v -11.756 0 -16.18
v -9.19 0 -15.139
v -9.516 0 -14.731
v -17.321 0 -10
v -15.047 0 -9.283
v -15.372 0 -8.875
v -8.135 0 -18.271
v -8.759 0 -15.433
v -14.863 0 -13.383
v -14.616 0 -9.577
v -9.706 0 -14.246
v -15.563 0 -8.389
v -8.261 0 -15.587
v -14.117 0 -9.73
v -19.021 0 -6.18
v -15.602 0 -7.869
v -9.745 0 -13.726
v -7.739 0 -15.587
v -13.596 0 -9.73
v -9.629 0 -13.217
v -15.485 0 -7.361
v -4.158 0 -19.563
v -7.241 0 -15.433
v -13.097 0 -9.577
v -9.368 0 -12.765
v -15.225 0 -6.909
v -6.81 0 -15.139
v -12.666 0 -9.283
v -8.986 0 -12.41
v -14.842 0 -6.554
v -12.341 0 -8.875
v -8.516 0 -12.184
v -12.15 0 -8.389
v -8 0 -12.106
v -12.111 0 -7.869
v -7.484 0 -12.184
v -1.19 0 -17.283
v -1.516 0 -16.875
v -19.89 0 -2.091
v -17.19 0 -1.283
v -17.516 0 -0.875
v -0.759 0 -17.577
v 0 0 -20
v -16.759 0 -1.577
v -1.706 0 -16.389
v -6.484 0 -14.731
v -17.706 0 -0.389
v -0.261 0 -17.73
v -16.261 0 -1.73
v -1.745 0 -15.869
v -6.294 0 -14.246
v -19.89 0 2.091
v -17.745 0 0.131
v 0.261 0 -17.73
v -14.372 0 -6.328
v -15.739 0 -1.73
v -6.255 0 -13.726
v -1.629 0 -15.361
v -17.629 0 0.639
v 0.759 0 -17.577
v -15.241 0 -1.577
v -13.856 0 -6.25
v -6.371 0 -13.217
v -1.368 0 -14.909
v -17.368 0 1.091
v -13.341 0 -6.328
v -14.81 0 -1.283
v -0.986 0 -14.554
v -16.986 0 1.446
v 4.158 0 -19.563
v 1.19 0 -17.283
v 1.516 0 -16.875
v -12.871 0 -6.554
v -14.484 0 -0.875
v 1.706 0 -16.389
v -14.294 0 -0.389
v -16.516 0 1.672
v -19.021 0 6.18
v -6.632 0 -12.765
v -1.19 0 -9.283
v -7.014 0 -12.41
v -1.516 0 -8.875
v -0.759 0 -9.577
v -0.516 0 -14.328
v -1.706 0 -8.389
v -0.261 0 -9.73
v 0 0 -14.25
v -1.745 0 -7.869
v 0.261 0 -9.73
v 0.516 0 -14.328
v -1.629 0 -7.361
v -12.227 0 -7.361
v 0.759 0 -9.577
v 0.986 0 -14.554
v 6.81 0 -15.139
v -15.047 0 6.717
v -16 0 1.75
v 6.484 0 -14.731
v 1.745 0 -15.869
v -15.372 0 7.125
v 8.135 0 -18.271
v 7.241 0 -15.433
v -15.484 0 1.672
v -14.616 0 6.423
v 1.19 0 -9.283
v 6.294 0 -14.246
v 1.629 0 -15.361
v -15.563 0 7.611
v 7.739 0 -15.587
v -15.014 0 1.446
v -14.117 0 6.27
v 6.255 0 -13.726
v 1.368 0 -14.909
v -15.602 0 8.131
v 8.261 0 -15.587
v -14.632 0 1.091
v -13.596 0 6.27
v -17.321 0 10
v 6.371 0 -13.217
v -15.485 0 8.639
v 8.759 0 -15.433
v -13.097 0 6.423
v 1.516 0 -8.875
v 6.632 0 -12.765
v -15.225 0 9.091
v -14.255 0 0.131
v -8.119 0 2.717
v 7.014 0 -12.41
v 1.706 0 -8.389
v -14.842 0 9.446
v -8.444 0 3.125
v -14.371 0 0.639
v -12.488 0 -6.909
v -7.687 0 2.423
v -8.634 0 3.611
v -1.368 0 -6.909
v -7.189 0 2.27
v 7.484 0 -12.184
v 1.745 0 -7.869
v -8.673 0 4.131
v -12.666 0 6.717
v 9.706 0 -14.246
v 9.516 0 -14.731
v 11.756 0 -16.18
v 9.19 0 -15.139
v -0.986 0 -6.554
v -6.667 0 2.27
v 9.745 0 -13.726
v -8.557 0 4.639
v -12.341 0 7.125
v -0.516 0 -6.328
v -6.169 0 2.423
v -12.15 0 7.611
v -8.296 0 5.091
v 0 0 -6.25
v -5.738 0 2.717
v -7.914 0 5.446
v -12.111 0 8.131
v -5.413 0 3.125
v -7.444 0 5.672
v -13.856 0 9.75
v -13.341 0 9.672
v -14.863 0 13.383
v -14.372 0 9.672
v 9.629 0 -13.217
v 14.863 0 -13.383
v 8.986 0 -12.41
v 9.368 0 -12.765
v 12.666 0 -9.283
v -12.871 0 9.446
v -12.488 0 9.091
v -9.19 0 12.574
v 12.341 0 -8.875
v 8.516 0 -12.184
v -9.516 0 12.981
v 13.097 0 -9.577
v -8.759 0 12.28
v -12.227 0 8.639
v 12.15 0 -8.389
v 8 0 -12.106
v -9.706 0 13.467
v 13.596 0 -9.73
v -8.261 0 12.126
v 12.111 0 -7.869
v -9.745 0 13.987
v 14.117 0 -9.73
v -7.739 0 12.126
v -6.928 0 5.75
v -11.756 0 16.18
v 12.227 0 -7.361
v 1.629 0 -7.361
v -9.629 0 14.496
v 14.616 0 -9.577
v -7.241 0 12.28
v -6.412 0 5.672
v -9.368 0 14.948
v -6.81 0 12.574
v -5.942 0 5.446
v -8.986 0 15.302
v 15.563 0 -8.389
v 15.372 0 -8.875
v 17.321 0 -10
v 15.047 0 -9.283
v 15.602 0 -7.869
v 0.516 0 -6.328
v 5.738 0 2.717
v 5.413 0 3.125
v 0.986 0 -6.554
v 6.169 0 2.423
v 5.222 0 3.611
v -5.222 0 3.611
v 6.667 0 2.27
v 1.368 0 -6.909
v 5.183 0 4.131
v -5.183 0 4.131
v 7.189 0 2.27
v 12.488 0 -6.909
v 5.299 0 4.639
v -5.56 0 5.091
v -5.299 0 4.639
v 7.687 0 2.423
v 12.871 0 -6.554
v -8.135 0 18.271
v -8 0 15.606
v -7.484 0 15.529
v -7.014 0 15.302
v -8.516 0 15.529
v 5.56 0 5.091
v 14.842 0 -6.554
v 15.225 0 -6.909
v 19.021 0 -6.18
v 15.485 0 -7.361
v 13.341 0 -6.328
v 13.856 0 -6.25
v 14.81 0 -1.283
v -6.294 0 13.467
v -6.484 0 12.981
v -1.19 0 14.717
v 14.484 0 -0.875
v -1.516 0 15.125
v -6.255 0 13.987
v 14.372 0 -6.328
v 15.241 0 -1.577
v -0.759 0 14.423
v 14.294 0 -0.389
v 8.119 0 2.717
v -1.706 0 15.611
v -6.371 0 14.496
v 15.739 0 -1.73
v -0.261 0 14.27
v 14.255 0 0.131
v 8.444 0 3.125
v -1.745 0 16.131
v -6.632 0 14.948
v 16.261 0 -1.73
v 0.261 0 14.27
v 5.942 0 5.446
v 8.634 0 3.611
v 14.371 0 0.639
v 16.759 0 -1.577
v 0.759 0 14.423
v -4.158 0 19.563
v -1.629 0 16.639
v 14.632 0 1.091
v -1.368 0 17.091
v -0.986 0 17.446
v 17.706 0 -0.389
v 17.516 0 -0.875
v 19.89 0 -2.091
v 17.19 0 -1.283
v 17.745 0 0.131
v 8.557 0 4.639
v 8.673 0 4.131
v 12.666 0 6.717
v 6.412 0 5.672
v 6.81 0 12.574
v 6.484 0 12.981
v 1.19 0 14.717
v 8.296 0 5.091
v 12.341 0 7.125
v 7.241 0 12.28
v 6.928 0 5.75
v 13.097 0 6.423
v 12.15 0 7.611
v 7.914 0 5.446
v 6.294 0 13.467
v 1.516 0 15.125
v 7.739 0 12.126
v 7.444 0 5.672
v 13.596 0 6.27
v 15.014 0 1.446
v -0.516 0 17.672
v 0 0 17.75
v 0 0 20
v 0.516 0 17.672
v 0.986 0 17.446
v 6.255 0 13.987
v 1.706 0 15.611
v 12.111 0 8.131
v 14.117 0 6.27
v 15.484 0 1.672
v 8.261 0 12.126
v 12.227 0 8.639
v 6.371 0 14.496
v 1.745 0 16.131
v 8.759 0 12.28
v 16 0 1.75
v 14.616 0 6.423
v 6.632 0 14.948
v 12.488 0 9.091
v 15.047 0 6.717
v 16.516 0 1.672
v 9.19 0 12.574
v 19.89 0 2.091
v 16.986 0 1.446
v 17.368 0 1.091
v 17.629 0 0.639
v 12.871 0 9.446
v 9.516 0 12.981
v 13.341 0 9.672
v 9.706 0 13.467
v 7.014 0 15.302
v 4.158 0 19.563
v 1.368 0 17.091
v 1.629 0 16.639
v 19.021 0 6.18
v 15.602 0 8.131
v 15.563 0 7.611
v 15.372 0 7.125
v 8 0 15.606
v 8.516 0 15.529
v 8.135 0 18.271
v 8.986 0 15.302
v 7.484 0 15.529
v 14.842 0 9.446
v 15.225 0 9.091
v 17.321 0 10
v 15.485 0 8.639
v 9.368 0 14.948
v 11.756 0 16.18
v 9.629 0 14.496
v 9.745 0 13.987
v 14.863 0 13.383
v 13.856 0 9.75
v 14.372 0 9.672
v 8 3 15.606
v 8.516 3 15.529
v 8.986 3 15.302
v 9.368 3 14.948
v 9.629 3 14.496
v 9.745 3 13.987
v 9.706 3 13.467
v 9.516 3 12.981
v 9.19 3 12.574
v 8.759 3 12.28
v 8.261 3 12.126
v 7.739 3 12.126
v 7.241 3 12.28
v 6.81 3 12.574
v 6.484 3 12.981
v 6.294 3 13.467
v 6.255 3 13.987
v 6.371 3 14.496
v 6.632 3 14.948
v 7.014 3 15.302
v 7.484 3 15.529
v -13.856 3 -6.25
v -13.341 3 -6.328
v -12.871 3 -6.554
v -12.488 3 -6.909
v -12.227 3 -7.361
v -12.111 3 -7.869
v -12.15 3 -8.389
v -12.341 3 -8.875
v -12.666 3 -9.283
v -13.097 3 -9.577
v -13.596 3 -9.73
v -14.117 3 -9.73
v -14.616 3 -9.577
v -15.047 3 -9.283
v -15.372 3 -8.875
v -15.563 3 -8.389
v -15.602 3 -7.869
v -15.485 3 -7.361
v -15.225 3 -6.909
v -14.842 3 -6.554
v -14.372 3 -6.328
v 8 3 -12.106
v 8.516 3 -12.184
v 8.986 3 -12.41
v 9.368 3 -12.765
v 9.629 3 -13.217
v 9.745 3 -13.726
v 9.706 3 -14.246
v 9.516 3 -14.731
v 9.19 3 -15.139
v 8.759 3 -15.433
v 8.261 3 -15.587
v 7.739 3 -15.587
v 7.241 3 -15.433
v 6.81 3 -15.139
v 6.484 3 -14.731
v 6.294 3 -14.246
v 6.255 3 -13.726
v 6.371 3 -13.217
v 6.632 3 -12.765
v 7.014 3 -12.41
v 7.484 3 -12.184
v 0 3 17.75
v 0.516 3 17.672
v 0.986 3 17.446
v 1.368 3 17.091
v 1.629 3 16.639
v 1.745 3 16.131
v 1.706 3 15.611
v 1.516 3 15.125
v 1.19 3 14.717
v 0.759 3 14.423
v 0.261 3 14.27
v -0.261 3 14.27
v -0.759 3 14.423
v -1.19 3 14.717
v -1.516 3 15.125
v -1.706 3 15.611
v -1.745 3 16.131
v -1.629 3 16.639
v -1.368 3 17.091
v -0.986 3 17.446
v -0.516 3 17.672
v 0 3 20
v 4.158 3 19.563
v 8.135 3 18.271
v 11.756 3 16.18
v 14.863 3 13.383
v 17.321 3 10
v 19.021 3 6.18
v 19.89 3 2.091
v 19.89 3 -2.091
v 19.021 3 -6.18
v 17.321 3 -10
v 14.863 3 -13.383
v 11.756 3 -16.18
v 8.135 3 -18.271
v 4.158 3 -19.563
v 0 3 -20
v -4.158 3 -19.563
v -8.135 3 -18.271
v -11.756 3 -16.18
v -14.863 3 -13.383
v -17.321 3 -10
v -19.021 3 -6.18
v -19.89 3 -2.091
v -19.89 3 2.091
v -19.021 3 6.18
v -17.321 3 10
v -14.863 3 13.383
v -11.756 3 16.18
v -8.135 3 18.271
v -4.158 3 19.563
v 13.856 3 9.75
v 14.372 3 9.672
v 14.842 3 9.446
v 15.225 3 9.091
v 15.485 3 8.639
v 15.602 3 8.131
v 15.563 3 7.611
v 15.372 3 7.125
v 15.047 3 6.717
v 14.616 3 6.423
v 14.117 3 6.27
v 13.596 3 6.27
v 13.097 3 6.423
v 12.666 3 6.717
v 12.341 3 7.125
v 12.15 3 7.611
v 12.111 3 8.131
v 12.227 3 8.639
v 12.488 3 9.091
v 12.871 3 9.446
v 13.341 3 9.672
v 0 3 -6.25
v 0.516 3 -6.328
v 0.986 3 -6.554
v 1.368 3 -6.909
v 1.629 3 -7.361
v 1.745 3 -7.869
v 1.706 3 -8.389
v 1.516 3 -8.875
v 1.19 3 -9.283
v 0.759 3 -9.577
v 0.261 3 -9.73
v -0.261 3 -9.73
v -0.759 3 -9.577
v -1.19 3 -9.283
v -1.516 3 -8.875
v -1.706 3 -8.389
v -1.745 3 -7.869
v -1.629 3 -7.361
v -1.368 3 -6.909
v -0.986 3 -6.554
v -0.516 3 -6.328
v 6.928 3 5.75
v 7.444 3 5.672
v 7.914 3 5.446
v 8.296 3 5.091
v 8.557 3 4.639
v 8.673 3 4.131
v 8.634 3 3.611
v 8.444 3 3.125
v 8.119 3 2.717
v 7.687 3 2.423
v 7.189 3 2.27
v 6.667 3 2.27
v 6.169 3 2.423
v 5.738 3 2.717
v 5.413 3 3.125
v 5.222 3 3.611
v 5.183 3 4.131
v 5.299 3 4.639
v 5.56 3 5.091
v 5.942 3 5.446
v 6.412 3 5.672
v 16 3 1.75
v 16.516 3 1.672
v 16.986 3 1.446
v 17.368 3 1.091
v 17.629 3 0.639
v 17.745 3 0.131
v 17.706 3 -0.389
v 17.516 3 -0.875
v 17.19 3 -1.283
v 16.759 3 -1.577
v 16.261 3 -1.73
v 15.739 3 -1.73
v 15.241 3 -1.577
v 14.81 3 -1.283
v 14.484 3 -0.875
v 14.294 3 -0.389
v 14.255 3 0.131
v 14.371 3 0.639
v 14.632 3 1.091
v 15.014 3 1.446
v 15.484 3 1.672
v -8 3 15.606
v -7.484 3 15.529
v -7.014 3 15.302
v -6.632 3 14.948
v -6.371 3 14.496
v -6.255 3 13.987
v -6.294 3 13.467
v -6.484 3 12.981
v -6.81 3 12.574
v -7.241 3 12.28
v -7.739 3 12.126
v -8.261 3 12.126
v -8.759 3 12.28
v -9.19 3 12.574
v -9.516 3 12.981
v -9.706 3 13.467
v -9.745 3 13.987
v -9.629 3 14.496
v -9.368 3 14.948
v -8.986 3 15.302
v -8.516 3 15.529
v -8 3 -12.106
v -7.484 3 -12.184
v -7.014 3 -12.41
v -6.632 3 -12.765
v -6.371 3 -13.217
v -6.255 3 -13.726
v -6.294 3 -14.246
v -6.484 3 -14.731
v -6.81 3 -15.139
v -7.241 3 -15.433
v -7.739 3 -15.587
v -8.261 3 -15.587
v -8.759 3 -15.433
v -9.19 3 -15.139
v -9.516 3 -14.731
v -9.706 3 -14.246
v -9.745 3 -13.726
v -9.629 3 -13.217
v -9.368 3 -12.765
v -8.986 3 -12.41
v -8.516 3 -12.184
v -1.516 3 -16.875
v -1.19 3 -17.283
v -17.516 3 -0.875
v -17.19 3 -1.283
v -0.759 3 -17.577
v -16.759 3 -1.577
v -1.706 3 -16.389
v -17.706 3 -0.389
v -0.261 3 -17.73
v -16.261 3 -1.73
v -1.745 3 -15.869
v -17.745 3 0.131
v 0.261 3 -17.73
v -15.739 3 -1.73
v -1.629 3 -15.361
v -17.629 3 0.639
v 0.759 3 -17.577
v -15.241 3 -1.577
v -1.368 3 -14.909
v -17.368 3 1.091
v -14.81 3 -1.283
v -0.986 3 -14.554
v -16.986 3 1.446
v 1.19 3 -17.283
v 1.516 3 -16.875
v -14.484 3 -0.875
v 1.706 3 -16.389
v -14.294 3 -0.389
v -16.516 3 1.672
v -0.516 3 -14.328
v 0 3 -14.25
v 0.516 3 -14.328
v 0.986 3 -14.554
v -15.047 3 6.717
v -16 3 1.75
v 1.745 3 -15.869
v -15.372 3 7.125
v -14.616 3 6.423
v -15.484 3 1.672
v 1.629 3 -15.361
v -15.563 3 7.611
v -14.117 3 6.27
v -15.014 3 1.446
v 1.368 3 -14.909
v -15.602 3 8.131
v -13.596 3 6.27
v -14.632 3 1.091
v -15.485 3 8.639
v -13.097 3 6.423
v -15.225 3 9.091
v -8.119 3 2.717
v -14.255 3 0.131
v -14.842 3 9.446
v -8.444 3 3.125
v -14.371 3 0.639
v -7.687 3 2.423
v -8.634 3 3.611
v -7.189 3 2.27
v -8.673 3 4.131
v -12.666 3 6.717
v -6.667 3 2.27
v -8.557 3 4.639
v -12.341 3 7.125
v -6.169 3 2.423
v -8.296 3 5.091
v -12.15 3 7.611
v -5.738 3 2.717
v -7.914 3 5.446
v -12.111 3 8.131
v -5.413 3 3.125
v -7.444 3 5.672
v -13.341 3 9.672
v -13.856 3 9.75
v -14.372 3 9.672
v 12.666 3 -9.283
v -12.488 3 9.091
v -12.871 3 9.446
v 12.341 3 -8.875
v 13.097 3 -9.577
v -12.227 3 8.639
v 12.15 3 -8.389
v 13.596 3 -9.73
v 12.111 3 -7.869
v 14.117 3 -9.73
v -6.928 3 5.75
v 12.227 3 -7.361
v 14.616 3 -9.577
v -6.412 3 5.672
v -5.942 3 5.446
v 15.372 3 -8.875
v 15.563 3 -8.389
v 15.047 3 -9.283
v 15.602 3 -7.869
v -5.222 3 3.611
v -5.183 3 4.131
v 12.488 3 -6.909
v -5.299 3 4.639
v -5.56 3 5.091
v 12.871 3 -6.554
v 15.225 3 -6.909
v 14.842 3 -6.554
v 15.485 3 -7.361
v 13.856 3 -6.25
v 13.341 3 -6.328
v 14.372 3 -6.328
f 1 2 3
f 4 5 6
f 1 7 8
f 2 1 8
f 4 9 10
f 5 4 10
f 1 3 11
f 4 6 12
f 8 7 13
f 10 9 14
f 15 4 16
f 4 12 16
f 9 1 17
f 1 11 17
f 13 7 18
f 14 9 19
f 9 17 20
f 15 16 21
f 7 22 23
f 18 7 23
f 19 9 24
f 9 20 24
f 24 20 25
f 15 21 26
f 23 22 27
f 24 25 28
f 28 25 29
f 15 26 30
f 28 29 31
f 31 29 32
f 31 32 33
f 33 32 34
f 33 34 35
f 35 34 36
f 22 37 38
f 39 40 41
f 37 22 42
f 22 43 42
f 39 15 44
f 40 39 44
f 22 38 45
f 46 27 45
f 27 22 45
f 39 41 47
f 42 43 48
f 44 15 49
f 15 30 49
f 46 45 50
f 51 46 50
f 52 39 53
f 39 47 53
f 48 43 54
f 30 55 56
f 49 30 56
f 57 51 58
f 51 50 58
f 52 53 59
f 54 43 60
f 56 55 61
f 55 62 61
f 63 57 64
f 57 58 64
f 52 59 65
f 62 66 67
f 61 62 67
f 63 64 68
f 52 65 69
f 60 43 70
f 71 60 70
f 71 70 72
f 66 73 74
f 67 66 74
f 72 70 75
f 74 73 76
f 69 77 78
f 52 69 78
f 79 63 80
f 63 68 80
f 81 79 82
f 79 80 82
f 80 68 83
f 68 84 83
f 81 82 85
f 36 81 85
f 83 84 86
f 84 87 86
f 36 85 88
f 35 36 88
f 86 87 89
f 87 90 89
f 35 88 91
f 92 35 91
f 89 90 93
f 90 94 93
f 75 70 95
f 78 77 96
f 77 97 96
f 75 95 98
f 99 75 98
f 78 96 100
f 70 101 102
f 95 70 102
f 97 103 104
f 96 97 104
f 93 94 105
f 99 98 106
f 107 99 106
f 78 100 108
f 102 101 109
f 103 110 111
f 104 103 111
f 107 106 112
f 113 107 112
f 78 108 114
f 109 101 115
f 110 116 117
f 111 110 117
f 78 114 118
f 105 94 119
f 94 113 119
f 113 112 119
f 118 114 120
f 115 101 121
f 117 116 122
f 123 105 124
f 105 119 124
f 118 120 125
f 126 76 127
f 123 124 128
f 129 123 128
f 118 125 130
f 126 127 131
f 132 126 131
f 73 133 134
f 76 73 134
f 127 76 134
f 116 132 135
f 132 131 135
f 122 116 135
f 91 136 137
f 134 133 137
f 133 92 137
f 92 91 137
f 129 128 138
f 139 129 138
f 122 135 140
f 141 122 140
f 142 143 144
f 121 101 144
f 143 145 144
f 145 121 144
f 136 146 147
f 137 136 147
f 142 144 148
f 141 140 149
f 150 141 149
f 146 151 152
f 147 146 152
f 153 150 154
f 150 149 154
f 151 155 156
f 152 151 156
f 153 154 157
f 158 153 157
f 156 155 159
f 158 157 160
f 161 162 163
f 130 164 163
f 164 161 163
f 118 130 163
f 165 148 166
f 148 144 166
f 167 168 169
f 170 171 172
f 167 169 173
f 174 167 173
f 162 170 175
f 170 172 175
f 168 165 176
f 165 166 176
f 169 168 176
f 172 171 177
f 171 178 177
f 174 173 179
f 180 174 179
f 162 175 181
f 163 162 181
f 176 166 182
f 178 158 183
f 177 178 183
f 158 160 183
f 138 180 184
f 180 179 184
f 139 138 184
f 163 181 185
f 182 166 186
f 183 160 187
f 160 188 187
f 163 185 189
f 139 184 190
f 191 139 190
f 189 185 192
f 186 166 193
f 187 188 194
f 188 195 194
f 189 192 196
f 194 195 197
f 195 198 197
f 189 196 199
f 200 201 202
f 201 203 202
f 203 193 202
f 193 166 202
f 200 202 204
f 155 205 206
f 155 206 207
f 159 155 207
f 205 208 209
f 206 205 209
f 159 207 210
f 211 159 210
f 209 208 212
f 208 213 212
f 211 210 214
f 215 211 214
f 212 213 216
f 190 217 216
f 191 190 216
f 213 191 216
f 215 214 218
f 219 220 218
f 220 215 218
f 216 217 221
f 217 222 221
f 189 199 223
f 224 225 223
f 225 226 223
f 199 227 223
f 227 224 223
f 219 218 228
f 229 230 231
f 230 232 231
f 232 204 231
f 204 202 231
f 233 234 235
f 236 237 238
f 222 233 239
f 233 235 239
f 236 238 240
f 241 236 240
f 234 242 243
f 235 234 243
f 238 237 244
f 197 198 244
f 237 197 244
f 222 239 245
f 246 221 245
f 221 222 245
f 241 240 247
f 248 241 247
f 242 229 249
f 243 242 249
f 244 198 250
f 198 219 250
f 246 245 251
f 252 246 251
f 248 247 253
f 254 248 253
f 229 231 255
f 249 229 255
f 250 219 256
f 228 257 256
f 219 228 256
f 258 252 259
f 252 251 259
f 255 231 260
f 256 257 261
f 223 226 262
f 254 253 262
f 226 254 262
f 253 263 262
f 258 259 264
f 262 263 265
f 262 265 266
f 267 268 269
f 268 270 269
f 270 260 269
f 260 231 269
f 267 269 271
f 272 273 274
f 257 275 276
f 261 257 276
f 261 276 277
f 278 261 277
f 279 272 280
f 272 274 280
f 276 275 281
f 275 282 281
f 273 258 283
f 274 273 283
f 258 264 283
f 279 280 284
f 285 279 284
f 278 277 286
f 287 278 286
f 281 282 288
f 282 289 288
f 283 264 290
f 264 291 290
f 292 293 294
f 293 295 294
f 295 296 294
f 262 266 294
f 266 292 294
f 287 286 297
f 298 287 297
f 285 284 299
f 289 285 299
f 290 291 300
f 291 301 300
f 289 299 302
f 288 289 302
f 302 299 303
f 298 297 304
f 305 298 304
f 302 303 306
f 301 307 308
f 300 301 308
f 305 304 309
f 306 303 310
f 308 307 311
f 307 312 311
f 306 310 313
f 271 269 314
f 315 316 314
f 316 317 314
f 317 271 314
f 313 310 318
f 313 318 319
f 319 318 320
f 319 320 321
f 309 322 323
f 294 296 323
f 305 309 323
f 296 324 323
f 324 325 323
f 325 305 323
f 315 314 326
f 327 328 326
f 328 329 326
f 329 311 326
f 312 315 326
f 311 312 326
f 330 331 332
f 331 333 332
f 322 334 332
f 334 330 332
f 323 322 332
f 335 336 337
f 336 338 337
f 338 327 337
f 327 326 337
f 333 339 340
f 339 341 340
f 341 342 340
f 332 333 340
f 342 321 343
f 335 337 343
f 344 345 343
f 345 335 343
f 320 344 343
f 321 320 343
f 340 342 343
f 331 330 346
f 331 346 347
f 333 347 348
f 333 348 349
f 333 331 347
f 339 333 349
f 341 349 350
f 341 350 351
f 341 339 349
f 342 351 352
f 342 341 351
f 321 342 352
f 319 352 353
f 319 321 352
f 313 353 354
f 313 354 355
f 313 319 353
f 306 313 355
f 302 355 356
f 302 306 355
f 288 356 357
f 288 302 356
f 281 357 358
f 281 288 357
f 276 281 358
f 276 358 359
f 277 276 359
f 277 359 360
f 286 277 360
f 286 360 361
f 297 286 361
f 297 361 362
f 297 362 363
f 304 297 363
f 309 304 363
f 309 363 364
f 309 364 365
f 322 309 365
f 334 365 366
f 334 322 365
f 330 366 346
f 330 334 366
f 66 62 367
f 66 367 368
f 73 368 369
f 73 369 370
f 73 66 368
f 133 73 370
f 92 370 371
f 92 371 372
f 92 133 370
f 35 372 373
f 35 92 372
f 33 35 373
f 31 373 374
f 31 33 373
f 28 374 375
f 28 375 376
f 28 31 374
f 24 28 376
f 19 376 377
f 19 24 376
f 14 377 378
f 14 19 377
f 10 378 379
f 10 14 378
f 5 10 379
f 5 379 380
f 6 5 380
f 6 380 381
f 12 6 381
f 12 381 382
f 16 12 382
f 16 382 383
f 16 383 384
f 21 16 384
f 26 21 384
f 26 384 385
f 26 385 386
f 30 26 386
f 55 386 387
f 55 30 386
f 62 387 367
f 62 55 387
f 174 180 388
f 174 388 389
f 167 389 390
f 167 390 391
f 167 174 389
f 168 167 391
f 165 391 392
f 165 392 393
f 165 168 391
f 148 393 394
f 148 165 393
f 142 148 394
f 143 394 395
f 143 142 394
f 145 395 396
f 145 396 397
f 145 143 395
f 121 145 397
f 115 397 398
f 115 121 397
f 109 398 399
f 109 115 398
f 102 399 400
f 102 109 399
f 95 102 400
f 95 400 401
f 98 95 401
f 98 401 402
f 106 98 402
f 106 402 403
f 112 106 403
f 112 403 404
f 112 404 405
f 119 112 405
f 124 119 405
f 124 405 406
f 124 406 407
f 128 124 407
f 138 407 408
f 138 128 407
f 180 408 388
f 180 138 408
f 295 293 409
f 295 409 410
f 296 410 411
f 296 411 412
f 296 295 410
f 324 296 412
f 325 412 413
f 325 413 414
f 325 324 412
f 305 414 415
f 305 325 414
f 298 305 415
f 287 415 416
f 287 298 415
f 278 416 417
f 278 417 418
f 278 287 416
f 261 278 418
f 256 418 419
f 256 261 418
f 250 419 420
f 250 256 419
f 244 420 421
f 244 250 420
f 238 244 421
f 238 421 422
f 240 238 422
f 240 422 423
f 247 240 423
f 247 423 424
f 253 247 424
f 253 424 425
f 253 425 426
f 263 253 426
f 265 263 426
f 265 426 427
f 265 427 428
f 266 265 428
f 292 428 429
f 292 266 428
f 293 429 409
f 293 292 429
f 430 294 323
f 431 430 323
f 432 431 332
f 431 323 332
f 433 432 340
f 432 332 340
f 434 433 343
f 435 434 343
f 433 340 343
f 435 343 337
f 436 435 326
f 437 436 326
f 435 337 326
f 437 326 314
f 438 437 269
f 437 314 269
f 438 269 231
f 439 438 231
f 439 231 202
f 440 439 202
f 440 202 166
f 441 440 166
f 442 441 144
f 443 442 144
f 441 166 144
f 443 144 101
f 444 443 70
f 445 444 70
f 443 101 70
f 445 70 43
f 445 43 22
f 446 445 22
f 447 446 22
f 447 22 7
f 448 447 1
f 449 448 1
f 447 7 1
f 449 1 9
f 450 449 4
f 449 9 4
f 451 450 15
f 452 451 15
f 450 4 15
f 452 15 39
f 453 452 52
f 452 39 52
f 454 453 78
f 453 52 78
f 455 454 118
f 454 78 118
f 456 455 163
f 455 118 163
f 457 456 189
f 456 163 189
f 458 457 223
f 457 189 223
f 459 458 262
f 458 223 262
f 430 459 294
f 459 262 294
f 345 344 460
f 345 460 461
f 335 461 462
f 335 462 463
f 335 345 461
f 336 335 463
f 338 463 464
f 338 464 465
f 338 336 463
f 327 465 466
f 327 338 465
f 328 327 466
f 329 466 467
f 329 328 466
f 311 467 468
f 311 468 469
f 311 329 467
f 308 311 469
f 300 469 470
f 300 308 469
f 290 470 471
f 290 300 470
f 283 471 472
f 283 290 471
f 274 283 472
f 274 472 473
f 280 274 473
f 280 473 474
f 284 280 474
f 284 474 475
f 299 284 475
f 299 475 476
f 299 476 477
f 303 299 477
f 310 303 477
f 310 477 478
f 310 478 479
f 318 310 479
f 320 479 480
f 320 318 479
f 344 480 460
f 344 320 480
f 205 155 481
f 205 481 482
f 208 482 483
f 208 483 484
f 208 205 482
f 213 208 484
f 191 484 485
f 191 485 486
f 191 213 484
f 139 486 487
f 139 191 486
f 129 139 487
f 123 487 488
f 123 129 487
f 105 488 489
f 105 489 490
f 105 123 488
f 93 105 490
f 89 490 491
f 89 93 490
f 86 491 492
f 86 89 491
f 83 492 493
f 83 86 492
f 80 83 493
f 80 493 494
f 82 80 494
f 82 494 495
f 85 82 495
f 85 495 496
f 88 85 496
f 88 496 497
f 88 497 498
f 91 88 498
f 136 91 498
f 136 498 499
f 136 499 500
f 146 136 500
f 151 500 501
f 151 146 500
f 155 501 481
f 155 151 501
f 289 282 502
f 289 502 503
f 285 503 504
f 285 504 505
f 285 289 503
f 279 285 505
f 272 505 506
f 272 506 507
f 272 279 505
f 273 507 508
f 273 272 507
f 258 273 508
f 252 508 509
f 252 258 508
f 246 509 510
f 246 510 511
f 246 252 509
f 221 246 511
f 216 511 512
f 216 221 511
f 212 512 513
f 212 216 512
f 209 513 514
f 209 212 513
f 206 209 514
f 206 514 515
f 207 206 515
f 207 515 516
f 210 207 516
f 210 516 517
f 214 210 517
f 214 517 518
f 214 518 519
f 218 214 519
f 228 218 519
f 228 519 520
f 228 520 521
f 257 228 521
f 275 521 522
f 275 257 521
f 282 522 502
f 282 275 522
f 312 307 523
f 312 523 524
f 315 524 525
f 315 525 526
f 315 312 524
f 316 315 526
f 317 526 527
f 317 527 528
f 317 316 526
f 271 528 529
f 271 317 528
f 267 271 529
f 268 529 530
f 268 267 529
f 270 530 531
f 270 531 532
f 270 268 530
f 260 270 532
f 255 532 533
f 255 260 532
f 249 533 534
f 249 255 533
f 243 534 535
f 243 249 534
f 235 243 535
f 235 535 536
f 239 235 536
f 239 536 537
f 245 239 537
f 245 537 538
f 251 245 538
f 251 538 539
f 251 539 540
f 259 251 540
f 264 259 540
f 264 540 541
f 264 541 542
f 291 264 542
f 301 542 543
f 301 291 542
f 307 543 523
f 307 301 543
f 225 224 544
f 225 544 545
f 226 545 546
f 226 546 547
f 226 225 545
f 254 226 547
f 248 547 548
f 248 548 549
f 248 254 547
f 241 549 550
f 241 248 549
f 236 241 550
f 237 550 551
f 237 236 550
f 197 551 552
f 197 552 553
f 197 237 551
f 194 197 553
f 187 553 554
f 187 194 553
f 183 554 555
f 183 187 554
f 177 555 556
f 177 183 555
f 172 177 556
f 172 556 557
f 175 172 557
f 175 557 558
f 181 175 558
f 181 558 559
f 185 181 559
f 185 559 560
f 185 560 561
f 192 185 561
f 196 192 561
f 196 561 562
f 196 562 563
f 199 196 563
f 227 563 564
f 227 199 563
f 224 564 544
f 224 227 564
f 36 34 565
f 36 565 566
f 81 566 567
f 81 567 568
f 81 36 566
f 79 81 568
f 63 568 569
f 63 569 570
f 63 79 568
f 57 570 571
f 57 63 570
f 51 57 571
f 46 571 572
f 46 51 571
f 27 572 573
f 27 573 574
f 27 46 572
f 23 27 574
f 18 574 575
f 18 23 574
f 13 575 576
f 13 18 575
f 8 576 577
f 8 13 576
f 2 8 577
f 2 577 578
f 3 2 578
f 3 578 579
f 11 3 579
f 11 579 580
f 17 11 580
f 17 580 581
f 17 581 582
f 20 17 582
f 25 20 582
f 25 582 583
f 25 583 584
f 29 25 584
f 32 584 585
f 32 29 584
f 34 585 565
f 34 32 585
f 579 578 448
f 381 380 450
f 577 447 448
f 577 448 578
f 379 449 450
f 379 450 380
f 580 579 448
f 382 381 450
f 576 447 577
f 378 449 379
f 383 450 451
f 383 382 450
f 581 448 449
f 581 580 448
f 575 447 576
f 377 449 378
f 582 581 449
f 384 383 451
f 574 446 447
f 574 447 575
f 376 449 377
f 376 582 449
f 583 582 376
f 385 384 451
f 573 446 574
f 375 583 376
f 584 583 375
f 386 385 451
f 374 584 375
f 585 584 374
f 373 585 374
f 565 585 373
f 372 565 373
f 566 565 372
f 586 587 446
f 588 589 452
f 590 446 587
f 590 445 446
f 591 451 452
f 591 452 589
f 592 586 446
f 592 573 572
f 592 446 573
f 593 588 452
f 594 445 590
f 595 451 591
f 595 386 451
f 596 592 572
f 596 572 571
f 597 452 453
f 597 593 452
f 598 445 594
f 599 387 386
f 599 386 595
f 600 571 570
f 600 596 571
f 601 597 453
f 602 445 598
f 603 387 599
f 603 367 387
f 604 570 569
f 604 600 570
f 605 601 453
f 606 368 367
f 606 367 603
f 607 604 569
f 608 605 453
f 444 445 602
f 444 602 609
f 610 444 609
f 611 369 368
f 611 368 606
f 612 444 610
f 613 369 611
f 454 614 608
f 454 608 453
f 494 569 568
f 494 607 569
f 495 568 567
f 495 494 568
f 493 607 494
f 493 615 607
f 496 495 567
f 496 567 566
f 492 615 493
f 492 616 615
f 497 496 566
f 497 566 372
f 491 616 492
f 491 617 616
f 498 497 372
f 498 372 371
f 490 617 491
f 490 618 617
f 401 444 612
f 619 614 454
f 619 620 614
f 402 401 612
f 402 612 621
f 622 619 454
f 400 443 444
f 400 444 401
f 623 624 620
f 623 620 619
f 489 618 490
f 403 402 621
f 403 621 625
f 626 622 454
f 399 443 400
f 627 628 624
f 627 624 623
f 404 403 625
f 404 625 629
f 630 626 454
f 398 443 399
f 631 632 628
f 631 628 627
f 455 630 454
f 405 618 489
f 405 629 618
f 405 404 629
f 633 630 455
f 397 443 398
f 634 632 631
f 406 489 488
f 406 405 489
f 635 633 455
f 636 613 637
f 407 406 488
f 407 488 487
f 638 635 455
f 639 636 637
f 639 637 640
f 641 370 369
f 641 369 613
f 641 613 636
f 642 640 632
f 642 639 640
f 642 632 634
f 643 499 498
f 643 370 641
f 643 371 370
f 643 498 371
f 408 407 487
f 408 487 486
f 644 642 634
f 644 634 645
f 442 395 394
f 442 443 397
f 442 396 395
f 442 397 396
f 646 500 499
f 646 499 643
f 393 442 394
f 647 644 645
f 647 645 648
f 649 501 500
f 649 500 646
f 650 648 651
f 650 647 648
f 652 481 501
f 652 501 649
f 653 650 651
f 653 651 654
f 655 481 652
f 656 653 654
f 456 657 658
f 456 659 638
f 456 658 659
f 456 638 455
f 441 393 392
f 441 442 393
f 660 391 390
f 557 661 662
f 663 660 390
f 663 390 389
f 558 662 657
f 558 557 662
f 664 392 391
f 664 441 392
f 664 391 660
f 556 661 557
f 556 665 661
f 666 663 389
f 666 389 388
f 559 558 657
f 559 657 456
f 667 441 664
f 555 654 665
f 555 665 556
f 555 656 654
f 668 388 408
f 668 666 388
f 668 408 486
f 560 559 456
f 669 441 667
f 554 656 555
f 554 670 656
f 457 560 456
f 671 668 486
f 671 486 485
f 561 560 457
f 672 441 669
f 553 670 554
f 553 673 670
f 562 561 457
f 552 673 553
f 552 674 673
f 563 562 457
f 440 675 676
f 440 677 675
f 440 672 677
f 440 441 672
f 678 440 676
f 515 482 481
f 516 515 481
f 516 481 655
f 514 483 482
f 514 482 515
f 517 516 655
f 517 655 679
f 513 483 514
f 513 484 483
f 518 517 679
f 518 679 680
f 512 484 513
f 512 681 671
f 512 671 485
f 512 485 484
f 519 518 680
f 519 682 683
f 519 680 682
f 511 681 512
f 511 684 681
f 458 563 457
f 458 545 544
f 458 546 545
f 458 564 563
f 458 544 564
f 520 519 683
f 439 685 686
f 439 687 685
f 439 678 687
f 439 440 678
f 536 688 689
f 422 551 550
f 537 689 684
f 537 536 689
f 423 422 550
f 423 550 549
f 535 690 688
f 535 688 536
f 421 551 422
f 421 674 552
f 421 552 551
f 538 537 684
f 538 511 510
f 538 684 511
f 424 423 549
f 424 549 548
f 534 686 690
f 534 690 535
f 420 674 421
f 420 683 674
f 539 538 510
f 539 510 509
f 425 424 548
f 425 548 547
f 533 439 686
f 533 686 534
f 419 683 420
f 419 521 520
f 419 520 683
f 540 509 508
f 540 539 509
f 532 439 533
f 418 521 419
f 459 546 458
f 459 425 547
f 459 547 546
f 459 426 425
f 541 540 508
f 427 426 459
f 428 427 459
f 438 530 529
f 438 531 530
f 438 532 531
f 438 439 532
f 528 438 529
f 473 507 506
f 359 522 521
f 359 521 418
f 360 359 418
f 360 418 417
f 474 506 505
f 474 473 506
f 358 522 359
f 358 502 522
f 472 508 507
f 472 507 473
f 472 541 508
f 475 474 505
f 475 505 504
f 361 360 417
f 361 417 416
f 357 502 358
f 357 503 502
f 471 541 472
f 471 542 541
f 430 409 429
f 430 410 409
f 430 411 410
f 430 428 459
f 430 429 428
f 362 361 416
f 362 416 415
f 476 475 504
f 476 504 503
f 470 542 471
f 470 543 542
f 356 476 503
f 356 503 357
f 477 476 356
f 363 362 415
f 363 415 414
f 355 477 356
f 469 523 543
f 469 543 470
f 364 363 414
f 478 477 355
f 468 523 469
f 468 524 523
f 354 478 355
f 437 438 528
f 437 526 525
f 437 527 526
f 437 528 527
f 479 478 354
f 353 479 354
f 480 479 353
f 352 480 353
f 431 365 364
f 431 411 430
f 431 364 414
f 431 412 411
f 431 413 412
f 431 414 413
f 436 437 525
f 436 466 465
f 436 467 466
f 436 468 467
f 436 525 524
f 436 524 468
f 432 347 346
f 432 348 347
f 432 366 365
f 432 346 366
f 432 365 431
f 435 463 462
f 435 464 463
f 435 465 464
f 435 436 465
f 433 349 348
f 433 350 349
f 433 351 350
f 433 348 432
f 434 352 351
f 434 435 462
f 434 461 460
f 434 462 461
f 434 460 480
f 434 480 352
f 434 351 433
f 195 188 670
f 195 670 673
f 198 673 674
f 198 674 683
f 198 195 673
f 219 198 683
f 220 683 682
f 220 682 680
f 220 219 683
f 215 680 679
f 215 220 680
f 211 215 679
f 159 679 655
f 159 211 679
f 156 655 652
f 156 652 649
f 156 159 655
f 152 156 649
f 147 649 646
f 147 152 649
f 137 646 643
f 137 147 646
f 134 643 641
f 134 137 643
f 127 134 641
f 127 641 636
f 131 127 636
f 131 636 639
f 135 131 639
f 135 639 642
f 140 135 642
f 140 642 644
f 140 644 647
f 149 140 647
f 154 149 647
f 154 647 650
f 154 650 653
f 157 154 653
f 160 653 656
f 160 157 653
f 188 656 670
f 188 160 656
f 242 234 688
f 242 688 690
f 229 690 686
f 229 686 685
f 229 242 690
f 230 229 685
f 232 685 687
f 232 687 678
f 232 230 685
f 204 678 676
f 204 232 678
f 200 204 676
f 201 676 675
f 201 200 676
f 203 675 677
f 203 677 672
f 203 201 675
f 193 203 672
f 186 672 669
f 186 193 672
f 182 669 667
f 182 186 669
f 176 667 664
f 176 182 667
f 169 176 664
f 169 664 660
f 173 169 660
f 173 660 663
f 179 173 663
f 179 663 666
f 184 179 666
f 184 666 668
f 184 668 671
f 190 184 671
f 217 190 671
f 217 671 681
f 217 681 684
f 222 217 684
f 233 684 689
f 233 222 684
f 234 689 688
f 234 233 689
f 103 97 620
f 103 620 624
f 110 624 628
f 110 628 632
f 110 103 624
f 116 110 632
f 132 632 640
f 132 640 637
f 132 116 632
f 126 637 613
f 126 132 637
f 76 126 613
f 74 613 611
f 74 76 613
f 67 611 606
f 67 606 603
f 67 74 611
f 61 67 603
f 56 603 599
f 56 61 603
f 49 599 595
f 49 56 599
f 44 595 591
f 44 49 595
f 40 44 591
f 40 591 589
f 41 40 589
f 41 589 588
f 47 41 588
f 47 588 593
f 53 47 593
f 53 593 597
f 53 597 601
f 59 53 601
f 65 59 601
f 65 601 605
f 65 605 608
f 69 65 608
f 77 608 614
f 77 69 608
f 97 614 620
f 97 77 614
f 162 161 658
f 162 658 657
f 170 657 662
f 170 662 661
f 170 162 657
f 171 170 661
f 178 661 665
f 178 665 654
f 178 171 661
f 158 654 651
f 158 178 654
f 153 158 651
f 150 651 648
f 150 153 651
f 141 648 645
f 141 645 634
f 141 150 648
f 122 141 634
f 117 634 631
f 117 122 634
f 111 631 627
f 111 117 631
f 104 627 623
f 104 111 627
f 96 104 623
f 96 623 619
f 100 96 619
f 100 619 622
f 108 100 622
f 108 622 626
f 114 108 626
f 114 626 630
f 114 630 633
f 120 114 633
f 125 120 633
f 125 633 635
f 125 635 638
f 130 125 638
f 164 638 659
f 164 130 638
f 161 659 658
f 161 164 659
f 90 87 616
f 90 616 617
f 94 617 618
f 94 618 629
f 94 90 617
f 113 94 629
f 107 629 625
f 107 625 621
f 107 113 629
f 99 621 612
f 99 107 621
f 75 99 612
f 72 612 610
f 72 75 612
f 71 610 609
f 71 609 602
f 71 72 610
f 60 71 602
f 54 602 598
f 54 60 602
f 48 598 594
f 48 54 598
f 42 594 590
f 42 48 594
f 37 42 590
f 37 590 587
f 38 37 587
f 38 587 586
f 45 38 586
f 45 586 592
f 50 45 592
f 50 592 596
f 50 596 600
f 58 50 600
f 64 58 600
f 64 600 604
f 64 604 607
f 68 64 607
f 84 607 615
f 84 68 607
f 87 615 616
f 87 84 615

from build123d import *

# Parameters (mm, degrees)
ESBO_O1_R                = 20
ESBO_O1_R_2              = 1.75
RESSALTO_EXTRUS_O1_DEPTH = 3


with BuildPart() as part:
    # Esboço1 → Ressalto-extrusão1 (new body)
    with BuildSketch(Plane(origin=(0, 0, 0), x_dir=(1, 0, 0), z_dir=(0, 1, 0))):
        with Locations(Location((0, 0, 0), (0, 0, 270))):
            Circle(ESBO_O1_R)
        with Locations(Location((-8, 13.856406461, 0), (0, 0, 270))):
            Circle(ESBO_O1_R_2, mode=Mode.SUBTRACT)
        with Locations(Location((-13.856406461, 8, 0), (0, 0, 270))):
            Circle(ESBO_O1_R_2, mode=Mode.SUBTRACT)
        with Locations(Location((-16, 0, 0), (0, 0, 270))):
            Circle(ESBO_O1_R_2, mode=Mode.SUBTRACT)
        with Locations(Location((-13.856406461, -8, 0), (0, 0, 270))):
            Circle(ESBO_O1_R_2, mode=Mode.SUBTRACT)
        with Locations(Location((-8, -13.856406461, 0), (0, 0, 270))):
            Circle(ESBO_O1_R_2, mode=Mode.SUBTRACT)
        with Locations(Location((8, -13.856406461, 0), (0, 0, 270))):
            Circle(ESBO_O1_R_2, mode=Mode.SUBTRACT)
        with Locations(Location((0, -16, 0), (0, 0, 270))):
            Circle(ESBO_O1_R_2, mode=Mode.SUBTRACT)
        with Locations(Location((13.856406461, -8, 0), (0, 0, 270))):
            Circle(ESBO_O1_R_2, mode=Mode.SUBTRACT)
        with Locations(Location((16, 0, 0), (0, 0, 270))):
            Circle(ESBO_O1_R_2, mode=Mode.SUBTRACT)
        with Locations(Location((13.856406461, 8, 0), (0, 0, 270))):
            Circle(ESBO_O1_R_2, mode=Mode.SUBTRACT)
        with Locations(Location((8, 13.856406461, 0), (0, 0, 270))):
            Circle(ESBO_O1_R_2, mode=Mode.SUBTRACT)
        with Locations(Location((0, 16, 0), (0, 0, 270))):
            Circle(ESBO_O1_R_2, mode=Mode.SUBTRACT)
        with Locations(Location((0, 8, 0), (0, 0, 270))):
            Circle(ESBO_O1_R_2, mode=Mode.SUBTRACT)
        with Locations(Location((-6.92820323, -4, 0), (0, 0, 270))):
            Circle(ESBO_O1_R_2, mode=Mode.SUBTRACT)
        with Locations(Location((6.92820323, -4, 0), (0, 0, 270))):
            Circle(ESBO_O1_R_2, mode=Mode.SUBTRACT)
    extrude(amount=RESSALTO_EXTRUS_O1_DEPTH)


solid = part.part
